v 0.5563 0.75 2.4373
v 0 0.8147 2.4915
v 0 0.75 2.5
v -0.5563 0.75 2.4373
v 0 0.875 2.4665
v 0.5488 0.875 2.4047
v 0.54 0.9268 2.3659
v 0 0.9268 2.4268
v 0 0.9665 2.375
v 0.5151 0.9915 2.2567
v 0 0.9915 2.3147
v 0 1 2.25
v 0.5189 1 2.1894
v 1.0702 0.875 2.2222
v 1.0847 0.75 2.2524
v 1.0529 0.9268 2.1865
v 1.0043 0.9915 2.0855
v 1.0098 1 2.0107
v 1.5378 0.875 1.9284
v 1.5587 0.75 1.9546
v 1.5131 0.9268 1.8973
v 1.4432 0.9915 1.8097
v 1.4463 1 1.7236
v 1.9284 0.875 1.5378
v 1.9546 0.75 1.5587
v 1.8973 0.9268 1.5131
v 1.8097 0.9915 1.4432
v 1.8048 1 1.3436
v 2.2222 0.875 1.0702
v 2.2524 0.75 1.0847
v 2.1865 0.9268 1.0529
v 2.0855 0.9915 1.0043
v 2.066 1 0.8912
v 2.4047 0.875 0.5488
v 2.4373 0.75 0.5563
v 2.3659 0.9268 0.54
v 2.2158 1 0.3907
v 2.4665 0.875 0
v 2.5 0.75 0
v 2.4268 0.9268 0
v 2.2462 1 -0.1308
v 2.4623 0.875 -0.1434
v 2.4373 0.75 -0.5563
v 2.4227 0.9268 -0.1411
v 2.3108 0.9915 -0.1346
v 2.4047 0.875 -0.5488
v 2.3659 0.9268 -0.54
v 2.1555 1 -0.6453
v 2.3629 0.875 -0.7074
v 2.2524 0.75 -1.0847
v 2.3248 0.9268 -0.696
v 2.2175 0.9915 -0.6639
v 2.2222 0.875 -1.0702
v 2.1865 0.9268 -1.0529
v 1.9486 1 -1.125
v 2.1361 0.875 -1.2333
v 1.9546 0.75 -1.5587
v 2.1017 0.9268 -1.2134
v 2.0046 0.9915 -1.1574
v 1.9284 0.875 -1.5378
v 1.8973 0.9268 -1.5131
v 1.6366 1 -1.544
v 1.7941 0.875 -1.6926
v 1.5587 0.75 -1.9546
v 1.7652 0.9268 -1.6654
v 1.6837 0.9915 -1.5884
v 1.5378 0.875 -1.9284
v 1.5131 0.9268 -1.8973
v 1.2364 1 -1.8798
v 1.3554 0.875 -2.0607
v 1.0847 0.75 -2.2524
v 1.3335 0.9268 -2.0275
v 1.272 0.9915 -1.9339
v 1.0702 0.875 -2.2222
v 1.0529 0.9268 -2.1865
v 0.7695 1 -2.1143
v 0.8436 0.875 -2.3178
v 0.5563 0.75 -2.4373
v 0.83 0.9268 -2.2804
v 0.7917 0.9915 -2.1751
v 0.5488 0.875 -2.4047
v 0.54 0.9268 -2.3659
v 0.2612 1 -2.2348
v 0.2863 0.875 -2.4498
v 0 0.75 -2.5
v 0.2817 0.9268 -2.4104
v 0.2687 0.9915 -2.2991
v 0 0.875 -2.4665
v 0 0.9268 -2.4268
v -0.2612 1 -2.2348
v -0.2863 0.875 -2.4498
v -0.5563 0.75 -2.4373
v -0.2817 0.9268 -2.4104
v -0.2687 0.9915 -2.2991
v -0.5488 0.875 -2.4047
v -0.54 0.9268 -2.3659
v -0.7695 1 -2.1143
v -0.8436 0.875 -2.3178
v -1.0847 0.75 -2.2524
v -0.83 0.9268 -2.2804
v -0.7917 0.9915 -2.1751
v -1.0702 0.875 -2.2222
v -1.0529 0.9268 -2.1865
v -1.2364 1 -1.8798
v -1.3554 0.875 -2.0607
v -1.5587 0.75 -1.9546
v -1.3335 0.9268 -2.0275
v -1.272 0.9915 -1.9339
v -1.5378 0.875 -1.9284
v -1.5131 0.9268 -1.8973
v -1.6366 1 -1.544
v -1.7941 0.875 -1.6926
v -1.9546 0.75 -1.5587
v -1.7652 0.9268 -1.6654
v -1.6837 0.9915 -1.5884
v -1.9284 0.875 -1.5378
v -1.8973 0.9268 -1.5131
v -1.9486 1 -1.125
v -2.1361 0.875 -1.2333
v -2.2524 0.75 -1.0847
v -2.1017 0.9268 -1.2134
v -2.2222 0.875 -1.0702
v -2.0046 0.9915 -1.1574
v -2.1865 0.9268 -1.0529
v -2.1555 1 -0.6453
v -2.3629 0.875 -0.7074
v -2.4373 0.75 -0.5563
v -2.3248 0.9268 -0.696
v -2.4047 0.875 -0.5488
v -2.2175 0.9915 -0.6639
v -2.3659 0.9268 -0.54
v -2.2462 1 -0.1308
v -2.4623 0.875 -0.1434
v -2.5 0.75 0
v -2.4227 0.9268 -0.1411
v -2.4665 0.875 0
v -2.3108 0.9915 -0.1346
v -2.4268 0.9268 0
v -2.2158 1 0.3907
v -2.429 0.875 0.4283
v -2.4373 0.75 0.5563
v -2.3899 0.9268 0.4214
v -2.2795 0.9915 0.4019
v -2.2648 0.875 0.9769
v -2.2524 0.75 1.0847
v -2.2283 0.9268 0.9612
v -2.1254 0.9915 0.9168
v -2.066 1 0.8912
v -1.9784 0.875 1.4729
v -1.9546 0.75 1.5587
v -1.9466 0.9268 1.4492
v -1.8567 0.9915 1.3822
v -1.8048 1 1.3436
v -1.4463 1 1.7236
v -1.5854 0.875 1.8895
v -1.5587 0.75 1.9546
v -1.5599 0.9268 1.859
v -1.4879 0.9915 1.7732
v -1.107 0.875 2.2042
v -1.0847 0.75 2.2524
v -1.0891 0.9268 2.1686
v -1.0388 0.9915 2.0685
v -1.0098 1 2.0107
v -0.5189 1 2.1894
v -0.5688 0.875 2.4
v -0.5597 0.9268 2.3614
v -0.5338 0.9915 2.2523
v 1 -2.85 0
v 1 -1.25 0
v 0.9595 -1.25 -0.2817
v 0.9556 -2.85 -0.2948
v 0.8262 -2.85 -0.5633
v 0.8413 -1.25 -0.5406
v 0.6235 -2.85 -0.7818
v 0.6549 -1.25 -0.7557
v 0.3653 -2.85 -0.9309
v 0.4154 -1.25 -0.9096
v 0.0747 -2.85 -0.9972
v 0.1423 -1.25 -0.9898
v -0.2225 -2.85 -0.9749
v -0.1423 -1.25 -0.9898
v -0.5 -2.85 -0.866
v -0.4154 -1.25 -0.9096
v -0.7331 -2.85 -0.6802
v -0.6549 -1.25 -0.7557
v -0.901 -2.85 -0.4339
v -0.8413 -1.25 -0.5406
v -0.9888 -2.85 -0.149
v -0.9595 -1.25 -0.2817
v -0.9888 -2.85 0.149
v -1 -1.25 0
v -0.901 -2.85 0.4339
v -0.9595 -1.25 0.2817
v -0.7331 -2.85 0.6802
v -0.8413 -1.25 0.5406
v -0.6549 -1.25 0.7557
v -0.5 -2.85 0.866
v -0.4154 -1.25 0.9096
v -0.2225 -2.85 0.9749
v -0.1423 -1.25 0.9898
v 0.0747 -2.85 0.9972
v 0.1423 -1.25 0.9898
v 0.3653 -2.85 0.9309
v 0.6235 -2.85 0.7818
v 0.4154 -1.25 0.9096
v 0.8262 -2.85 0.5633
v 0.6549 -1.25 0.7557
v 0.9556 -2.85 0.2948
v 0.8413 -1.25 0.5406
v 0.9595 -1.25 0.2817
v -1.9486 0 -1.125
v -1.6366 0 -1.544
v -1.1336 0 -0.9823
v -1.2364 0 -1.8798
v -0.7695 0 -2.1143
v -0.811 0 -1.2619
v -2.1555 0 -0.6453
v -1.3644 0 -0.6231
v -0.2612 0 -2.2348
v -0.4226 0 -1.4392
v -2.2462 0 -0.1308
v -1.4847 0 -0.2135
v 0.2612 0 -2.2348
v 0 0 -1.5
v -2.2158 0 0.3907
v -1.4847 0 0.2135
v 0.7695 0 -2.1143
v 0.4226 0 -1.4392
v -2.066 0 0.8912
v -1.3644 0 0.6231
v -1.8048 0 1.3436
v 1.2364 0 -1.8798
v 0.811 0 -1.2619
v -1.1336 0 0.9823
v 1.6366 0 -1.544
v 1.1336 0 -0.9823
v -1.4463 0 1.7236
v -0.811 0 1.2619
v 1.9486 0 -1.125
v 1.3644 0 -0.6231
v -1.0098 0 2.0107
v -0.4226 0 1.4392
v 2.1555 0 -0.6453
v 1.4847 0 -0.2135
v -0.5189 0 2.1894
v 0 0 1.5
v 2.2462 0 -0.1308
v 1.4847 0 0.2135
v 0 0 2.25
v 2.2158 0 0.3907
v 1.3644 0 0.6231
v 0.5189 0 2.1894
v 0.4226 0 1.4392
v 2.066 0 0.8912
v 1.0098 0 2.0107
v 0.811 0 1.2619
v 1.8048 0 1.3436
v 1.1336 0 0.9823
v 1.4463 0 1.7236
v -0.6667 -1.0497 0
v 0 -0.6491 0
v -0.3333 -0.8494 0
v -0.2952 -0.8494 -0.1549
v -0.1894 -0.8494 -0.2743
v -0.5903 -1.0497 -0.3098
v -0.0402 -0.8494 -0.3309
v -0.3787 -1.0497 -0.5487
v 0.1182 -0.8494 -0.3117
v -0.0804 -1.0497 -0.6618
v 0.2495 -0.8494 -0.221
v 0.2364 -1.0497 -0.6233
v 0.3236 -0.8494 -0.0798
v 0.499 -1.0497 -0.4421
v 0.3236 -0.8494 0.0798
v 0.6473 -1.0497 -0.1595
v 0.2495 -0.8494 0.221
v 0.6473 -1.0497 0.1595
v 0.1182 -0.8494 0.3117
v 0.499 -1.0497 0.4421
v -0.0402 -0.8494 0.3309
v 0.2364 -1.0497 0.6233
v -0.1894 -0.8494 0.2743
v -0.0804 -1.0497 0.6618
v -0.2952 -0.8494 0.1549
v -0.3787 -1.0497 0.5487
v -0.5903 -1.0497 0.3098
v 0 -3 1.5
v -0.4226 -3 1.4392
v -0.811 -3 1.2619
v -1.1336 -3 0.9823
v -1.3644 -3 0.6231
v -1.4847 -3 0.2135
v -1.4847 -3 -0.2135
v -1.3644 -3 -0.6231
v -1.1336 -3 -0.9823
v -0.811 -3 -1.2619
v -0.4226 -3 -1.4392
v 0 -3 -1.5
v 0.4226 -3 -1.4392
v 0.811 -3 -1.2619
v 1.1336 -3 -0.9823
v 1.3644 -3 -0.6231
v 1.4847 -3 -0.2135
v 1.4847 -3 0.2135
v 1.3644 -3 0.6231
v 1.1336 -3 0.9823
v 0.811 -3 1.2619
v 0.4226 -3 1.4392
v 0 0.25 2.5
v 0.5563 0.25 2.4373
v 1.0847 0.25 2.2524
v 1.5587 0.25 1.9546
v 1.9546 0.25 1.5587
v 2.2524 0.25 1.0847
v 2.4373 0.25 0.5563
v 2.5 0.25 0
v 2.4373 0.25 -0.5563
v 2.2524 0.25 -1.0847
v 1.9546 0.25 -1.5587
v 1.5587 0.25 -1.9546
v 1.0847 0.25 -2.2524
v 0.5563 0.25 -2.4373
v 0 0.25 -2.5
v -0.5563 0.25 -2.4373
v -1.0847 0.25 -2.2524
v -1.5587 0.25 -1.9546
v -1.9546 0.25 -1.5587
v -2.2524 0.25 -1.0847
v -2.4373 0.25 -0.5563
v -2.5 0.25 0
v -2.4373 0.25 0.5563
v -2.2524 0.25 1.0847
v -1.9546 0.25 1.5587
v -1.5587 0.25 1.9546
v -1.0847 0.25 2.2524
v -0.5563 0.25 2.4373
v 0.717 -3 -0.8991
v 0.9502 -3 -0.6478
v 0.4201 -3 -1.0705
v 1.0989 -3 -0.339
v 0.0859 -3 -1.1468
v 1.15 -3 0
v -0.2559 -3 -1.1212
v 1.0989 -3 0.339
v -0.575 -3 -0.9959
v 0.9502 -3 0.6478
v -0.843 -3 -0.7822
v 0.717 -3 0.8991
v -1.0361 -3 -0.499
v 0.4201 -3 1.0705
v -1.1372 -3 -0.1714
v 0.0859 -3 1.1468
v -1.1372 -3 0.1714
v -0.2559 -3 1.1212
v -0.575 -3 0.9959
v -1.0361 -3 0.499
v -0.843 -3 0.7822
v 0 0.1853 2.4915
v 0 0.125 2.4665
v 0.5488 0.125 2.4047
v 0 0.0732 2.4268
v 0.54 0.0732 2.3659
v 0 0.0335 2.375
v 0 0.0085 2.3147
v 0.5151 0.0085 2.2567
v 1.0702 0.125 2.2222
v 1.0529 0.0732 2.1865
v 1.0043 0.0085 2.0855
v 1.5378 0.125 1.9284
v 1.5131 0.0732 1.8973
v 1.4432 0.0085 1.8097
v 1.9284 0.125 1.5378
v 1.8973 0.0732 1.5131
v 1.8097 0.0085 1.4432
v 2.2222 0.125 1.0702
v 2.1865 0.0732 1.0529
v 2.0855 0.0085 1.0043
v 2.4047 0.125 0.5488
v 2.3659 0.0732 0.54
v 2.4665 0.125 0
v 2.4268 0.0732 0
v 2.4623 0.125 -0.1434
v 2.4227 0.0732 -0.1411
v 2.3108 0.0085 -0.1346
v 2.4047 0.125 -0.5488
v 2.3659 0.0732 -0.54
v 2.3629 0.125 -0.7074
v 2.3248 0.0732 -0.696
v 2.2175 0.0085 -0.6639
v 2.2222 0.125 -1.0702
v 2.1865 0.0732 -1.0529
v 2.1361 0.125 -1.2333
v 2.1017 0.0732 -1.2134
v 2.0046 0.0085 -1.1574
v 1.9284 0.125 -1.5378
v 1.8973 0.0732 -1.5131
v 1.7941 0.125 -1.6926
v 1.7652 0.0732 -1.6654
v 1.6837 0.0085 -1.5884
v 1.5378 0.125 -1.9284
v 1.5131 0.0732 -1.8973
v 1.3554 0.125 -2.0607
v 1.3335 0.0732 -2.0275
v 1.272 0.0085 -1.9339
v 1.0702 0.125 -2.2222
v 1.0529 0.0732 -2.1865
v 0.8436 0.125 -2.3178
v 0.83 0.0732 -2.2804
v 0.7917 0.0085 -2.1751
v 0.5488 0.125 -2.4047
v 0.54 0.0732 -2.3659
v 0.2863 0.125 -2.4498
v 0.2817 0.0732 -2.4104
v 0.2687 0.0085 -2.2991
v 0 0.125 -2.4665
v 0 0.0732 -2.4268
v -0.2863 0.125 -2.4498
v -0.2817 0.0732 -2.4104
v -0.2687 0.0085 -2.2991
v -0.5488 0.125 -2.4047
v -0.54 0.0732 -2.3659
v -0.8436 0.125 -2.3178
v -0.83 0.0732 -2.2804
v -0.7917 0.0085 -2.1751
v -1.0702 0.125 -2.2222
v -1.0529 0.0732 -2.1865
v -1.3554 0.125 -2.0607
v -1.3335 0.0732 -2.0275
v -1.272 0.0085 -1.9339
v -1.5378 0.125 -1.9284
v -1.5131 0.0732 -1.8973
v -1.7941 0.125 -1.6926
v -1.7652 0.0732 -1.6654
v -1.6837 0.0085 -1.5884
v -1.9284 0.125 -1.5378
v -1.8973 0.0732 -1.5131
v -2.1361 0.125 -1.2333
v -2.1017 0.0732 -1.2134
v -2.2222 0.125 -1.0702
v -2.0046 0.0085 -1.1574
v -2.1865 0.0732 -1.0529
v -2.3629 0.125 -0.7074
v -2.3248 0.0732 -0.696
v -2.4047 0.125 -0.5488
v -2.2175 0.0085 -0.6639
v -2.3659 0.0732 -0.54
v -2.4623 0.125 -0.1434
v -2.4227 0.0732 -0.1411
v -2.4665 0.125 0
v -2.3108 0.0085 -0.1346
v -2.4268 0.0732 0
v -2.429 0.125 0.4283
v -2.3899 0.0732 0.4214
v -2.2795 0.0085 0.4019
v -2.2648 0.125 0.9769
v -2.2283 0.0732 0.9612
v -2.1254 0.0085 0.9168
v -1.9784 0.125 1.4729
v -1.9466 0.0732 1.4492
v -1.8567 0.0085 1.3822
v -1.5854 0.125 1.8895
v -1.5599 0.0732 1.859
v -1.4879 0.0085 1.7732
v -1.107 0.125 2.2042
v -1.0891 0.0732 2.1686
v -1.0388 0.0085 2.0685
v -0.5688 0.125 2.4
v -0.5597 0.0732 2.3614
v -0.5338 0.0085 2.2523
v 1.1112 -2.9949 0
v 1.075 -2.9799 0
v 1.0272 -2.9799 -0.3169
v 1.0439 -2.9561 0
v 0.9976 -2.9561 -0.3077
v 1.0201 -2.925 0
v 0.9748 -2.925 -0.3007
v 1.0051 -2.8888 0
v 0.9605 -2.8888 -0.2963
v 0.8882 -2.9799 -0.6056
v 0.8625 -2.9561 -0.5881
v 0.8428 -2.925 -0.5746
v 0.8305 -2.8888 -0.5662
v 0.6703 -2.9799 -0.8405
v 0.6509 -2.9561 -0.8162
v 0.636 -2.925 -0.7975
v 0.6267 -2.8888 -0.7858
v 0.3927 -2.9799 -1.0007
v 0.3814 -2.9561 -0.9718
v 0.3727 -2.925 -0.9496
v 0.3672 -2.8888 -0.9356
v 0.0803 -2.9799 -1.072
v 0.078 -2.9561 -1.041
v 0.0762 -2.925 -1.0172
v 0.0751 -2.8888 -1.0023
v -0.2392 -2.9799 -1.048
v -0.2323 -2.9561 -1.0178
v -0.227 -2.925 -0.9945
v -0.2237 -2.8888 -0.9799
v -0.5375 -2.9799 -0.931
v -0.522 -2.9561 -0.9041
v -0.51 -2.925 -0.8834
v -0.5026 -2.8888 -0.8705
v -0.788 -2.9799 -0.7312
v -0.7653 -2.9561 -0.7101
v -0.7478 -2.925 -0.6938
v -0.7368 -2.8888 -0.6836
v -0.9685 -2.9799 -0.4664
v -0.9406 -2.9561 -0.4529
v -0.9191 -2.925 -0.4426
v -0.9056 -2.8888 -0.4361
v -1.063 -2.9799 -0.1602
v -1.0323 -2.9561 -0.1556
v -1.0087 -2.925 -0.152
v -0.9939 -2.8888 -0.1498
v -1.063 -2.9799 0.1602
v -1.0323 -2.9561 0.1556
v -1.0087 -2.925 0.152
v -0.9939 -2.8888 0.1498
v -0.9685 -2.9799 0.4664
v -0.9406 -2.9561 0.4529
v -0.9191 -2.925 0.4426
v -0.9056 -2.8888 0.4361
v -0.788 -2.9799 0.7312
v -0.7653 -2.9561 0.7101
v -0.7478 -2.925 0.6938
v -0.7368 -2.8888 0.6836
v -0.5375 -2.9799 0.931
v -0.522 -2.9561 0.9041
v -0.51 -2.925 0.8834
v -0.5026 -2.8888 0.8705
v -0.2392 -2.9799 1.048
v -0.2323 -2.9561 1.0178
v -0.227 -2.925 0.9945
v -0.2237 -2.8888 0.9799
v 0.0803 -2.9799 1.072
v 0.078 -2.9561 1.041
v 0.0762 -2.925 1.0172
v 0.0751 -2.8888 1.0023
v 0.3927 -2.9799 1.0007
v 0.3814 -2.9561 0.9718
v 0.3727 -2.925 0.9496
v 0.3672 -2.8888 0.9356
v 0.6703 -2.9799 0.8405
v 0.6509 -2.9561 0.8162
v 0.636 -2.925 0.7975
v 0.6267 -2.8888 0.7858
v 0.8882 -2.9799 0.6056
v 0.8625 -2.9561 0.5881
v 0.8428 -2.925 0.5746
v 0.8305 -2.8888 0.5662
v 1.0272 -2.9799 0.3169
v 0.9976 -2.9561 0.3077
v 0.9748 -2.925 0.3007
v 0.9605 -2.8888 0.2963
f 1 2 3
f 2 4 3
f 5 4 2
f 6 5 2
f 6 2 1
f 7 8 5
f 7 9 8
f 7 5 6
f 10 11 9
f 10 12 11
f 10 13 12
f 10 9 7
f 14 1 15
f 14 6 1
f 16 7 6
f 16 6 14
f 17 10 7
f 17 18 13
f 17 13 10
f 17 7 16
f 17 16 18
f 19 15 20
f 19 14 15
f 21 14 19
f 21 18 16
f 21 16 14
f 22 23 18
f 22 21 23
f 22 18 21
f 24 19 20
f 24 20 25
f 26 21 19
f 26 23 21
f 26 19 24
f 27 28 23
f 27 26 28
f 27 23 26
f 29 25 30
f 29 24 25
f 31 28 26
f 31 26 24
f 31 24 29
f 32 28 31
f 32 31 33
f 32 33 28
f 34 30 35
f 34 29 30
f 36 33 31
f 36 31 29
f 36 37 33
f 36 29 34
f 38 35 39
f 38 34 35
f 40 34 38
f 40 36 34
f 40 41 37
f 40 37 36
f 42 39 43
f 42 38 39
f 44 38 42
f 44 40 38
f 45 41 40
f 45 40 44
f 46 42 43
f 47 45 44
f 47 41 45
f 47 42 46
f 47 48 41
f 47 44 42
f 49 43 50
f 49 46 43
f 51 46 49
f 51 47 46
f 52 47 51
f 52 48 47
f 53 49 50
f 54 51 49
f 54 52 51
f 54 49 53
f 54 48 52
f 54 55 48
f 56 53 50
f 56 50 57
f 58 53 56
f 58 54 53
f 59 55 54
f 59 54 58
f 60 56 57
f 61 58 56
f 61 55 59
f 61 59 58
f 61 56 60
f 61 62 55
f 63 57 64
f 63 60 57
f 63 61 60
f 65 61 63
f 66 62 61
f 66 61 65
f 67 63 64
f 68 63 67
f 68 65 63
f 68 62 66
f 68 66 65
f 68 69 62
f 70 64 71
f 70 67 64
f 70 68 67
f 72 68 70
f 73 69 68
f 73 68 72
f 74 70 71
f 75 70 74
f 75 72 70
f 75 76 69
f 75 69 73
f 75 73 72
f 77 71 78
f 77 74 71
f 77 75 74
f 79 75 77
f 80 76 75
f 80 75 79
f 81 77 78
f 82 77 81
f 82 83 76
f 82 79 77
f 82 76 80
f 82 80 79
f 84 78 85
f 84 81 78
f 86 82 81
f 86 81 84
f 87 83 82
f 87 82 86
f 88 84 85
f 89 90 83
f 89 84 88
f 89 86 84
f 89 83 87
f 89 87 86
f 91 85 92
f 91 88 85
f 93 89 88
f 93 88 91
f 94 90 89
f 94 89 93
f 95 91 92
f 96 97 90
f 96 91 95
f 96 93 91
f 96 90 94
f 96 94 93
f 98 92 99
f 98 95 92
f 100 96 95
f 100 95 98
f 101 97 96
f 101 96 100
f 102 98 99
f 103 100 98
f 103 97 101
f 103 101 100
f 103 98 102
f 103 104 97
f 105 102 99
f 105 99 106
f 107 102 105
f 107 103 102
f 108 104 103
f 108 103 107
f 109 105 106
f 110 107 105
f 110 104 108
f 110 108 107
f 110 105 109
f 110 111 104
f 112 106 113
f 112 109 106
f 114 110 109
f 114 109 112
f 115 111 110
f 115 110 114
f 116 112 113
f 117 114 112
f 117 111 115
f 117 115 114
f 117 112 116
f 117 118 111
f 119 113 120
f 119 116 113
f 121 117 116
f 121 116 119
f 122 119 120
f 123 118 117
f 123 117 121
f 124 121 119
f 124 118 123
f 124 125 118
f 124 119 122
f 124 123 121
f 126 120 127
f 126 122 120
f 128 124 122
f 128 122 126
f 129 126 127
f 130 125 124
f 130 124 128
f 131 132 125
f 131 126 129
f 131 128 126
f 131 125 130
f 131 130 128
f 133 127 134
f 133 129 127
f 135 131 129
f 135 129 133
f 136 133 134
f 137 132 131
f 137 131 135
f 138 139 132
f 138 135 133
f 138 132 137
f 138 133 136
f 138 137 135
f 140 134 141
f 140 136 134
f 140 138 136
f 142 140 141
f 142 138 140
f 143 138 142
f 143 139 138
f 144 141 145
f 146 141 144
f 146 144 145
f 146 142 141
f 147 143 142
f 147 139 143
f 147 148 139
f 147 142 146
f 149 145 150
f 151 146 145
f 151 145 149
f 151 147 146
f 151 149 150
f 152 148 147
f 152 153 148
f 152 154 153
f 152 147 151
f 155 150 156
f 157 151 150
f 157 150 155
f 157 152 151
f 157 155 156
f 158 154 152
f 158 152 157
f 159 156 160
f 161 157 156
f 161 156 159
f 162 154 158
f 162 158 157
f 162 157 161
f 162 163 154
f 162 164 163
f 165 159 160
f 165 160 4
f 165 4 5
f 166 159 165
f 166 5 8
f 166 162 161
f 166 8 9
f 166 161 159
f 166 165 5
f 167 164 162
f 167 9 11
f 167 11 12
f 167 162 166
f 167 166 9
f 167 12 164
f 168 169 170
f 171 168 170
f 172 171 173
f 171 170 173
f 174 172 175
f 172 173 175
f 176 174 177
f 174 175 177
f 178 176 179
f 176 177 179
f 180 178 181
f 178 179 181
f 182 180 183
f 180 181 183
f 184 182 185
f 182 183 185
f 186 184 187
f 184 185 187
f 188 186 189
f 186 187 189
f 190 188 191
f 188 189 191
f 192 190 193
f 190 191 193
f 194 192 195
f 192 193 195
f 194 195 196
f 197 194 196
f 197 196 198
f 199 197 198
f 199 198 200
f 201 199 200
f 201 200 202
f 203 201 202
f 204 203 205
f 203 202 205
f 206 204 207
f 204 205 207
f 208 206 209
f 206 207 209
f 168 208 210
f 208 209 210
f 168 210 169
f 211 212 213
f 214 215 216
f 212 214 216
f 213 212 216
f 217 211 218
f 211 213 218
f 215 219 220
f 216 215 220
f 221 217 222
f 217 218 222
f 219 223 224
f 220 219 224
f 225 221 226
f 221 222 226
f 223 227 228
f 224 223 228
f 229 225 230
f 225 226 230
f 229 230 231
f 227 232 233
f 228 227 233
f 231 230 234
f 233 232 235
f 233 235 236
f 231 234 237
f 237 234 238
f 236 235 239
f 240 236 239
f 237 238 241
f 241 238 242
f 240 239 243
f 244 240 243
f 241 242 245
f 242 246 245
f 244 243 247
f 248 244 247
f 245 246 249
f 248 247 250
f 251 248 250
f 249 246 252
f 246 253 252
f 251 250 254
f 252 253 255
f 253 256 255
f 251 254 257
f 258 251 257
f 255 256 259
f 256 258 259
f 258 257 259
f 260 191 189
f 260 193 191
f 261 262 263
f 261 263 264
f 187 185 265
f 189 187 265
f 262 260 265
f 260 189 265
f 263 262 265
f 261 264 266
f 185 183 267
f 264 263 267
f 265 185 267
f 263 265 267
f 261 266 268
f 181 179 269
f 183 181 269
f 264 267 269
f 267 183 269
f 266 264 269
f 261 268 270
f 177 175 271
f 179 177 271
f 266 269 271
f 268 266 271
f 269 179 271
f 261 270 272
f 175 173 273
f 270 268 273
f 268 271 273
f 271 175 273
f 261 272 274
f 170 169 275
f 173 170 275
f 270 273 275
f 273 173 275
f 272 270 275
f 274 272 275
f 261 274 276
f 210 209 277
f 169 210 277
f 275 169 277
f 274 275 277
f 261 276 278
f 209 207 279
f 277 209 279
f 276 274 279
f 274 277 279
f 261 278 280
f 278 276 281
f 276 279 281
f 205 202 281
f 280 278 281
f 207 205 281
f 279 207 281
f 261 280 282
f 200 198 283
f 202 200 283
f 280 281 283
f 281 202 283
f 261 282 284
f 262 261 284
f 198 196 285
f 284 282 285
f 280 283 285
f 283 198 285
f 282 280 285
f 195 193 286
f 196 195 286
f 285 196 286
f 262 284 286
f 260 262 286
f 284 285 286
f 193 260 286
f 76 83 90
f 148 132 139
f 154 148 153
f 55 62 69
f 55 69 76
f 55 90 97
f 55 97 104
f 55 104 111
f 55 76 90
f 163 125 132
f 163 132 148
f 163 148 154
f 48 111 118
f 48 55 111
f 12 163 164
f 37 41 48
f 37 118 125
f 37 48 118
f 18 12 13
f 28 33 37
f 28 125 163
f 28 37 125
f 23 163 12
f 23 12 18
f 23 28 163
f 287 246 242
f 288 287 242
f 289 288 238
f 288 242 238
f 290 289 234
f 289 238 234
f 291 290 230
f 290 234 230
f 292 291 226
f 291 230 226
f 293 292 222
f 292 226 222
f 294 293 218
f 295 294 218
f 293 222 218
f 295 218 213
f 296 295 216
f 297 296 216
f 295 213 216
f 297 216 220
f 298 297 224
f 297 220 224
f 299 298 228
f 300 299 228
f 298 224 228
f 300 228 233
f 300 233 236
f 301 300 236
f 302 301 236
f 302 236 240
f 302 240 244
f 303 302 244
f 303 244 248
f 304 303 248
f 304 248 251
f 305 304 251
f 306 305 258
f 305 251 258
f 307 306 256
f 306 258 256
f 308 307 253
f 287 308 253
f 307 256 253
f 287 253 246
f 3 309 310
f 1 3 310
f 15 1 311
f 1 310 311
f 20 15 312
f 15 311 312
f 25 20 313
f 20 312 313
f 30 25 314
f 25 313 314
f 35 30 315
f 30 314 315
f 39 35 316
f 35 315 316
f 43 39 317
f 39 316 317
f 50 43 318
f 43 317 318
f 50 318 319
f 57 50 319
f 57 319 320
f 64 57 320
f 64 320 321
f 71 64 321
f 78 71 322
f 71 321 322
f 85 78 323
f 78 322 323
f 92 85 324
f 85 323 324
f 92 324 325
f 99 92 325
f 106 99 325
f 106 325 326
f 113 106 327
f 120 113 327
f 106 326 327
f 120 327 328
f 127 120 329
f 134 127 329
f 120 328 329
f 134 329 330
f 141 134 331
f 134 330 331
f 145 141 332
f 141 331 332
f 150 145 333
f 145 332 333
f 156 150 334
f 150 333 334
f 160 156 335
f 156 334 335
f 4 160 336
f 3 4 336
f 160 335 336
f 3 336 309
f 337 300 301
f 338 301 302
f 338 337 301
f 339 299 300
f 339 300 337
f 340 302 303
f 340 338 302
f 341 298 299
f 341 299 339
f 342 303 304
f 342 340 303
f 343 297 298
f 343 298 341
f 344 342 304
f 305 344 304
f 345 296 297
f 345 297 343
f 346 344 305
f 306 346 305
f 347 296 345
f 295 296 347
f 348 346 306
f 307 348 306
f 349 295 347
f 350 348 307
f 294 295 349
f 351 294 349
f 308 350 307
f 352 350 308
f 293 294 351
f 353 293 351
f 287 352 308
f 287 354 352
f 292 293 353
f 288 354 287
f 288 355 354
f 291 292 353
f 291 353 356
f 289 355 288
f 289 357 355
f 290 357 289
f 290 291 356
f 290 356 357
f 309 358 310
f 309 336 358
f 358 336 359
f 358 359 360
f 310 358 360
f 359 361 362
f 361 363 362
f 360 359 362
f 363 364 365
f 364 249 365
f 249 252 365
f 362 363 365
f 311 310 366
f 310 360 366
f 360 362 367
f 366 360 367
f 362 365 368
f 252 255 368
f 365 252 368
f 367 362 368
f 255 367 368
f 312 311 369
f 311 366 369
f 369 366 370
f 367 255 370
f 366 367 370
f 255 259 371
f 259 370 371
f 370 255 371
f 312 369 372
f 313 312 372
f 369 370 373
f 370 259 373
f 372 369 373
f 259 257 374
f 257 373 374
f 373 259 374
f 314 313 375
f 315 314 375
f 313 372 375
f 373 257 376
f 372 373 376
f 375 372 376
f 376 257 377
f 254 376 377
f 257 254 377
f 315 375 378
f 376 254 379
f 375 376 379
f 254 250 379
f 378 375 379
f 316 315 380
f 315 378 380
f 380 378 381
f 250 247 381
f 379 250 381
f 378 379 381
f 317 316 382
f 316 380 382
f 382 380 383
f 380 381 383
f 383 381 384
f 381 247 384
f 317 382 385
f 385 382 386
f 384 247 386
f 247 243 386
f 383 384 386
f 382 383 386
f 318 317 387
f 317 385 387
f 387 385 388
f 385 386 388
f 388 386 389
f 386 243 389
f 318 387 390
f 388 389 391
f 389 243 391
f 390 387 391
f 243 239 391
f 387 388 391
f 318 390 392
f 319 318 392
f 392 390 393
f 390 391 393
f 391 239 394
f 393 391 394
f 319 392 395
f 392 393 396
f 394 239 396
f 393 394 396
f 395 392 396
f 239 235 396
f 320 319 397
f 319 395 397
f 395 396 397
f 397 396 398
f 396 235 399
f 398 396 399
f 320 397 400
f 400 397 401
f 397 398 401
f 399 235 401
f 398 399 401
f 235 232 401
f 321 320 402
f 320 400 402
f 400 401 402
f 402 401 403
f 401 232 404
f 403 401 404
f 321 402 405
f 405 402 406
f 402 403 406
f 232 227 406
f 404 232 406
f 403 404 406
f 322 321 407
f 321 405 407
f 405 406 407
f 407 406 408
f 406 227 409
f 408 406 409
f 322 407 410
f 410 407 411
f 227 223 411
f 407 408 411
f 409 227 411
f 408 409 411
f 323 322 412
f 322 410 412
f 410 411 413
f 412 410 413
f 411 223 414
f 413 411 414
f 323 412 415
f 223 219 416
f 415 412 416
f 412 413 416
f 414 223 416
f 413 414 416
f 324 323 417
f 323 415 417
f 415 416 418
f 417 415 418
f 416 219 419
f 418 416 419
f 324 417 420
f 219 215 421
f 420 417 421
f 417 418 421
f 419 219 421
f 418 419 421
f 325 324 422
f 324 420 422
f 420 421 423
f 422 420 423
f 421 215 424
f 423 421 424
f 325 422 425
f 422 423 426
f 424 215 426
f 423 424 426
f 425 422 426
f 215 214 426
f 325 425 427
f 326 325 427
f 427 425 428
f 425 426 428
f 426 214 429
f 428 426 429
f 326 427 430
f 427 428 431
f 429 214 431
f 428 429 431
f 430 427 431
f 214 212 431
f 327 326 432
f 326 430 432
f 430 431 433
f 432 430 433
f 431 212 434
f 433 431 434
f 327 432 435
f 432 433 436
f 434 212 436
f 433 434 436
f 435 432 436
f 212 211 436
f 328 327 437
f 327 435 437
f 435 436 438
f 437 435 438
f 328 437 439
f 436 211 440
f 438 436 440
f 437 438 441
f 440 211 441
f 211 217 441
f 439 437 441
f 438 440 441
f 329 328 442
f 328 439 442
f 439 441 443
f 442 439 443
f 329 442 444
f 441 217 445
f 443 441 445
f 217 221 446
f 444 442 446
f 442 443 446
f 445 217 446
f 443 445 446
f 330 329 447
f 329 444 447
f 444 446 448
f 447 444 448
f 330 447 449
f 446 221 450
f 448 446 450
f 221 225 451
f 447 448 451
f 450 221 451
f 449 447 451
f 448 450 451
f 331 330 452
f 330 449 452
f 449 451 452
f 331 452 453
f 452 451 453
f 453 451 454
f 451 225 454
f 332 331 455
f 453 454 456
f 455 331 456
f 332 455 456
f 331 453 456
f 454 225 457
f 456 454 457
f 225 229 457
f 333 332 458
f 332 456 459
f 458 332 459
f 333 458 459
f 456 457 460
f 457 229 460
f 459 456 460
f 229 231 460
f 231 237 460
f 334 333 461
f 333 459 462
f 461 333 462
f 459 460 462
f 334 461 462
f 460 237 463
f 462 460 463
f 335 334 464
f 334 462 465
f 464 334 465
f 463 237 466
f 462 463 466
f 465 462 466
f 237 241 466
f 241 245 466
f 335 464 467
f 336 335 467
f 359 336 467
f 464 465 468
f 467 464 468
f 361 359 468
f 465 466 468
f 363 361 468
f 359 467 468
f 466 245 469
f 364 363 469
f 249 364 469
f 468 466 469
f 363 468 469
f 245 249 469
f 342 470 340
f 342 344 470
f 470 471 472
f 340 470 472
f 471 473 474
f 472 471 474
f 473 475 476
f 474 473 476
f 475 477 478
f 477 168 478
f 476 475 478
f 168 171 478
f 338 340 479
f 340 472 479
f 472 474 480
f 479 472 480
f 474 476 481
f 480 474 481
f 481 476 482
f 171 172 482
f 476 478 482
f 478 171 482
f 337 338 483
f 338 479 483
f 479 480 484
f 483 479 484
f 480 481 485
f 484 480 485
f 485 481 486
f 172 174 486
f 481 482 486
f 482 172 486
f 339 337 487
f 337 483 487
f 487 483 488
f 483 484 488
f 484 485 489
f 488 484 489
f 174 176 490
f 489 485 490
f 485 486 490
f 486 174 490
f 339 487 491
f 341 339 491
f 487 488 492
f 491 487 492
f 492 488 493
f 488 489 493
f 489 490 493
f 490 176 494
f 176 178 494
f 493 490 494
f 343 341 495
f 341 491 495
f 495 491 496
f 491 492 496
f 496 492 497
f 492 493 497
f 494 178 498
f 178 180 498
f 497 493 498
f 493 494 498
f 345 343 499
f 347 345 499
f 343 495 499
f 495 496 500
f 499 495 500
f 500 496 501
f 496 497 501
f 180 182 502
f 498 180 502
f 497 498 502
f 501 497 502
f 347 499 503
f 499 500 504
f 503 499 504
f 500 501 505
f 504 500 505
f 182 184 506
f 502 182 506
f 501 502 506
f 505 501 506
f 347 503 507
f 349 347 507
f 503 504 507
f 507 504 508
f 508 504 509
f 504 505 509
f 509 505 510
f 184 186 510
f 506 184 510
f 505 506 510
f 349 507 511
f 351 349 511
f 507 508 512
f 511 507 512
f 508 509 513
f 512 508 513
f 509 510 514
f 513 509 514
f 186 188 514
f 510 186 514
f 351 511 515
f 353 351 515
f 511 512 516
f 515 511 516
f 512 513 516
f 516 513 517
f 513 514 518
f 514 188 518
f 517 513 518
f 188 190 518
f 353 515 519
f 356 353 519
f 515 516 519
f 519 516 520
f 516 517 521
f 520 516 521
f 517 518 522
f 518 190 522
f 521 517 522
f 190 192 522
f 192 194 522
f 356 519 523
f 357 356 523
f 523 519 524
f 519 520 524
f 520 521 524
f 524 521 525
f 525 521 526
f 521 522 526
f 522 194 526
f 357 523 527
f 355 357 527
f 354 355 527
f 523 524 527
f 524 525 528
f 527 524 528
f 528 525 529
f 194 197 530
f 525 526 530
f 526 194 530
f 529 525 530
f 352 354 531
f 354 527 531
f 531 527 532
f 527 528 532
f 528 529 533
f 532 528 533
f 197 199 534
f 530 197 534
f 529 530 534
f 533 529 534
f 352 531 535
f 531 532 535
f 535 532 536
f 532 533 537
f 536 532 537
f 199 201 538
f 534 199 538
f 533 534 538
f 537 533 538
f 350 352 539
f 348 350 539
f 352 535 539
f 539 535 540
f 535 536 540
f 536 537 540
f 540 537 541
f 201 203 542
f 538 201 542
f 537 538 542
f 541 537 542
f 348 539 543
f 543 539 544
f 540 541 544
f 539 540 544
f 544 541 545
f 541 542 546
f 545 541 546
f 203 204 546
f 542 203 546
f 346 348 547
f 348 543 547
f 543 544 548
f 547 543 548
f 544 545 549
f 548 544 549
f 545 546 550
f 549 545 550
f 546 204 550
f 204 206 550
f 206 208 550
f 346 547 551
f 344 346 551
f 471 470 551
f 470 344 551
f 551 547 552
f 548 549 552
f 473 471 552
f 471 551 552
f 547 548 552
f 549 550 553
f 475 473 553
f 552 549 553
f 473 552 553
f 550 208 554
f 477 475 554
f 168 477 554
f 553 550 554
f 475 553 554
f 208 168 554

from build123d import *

# Parameters (mm, degrees)
SKETCH1_R                              = 2.5
BOSS_EXTRUDE1_DEPTH                    = 1
FILLET1_R                              = 0.25
SKETCH2_R                              = 1.5
BOSS_EXTRUDE2_DEPTH                    = 3
F_1_16_0_07874016_DIAMETER_HOLE1_D     = 2.000000064
F_1_16_0_07874016_DIAMETER_HOLE1_DEPTH = 1.75
F_1_16_0_07874016_DIAMETER_HOLE1_TIP   = 0.600860638
FILLET2_R                              = 0.15


with BuildPart() as part:
    # Sketch1 → Boss-Extrude1 (new body)
    with BuildSketch(Plane(origin=(0, 0, 0), x_dir=(1, 0, 0), z_dir=(0, 1, 0))):
        with Locations(Location((0, 0, 0), (0, 0, 270))):
            Circle(SKETCH1_R)
    extrude(amount=BOSS_EXTRUDE1_DEPTH)

    # Fillet1
    fillet1_edges = [part.edges().sort_by_distance(p)[0] for p in [
        (0, 0, -2.5),
        (0, 1, -2.5),
    ]]
    fillet(fillet1_edges, radius=FILLET1_R)

    # Sketch2 → Boss-Extrude2 (add)
    with BuildSketch(Plane.XZ):
        with Locations(Location((0, 0, 0), (0, 0, 90))):
            Circle(SKETCH2_R)
    extrude(amount=BOSS_EXTRUDE2_DEPTH)

    # 1/16 (0.07874016) Diameter Hole1
    with Locations(Plane(origin=(0, -3, 0), x_dir=(-1, 0, 0), z_dir=(0, -1, 0))):
        with Locations((0, 0)):
            Hole(F_1_16_0_07874016_DIAMETER_HOLE1_D / 2, depth=F_1_16_0_07874016_DIAMETER_HOLE1_DEPTH)
            with Locations((0, 0, -(F_1_16_0_07874016_DIAMETER_HOLE1_DEPTH + F_1_16_0_07874016_DIAMETER_HOLE1_TIP / 2))):  # 118° drill point
                Cone(0, F_1_16_0_07874016_DIAMETER_HOLE1_D / 2, F_1_16_0_07874016_DIAMETER_HOLE1_TIP, mode=Mode.SUBTRACT)

    # Fillet2
    fillet2_edges = [part.edges().sort_by_distance(p)[0] for p in [
        (-1.000000032, -3, 0),
    ]]
    fillet(fillet2_edges, radius=FILLET2_R)


solid = part.part
